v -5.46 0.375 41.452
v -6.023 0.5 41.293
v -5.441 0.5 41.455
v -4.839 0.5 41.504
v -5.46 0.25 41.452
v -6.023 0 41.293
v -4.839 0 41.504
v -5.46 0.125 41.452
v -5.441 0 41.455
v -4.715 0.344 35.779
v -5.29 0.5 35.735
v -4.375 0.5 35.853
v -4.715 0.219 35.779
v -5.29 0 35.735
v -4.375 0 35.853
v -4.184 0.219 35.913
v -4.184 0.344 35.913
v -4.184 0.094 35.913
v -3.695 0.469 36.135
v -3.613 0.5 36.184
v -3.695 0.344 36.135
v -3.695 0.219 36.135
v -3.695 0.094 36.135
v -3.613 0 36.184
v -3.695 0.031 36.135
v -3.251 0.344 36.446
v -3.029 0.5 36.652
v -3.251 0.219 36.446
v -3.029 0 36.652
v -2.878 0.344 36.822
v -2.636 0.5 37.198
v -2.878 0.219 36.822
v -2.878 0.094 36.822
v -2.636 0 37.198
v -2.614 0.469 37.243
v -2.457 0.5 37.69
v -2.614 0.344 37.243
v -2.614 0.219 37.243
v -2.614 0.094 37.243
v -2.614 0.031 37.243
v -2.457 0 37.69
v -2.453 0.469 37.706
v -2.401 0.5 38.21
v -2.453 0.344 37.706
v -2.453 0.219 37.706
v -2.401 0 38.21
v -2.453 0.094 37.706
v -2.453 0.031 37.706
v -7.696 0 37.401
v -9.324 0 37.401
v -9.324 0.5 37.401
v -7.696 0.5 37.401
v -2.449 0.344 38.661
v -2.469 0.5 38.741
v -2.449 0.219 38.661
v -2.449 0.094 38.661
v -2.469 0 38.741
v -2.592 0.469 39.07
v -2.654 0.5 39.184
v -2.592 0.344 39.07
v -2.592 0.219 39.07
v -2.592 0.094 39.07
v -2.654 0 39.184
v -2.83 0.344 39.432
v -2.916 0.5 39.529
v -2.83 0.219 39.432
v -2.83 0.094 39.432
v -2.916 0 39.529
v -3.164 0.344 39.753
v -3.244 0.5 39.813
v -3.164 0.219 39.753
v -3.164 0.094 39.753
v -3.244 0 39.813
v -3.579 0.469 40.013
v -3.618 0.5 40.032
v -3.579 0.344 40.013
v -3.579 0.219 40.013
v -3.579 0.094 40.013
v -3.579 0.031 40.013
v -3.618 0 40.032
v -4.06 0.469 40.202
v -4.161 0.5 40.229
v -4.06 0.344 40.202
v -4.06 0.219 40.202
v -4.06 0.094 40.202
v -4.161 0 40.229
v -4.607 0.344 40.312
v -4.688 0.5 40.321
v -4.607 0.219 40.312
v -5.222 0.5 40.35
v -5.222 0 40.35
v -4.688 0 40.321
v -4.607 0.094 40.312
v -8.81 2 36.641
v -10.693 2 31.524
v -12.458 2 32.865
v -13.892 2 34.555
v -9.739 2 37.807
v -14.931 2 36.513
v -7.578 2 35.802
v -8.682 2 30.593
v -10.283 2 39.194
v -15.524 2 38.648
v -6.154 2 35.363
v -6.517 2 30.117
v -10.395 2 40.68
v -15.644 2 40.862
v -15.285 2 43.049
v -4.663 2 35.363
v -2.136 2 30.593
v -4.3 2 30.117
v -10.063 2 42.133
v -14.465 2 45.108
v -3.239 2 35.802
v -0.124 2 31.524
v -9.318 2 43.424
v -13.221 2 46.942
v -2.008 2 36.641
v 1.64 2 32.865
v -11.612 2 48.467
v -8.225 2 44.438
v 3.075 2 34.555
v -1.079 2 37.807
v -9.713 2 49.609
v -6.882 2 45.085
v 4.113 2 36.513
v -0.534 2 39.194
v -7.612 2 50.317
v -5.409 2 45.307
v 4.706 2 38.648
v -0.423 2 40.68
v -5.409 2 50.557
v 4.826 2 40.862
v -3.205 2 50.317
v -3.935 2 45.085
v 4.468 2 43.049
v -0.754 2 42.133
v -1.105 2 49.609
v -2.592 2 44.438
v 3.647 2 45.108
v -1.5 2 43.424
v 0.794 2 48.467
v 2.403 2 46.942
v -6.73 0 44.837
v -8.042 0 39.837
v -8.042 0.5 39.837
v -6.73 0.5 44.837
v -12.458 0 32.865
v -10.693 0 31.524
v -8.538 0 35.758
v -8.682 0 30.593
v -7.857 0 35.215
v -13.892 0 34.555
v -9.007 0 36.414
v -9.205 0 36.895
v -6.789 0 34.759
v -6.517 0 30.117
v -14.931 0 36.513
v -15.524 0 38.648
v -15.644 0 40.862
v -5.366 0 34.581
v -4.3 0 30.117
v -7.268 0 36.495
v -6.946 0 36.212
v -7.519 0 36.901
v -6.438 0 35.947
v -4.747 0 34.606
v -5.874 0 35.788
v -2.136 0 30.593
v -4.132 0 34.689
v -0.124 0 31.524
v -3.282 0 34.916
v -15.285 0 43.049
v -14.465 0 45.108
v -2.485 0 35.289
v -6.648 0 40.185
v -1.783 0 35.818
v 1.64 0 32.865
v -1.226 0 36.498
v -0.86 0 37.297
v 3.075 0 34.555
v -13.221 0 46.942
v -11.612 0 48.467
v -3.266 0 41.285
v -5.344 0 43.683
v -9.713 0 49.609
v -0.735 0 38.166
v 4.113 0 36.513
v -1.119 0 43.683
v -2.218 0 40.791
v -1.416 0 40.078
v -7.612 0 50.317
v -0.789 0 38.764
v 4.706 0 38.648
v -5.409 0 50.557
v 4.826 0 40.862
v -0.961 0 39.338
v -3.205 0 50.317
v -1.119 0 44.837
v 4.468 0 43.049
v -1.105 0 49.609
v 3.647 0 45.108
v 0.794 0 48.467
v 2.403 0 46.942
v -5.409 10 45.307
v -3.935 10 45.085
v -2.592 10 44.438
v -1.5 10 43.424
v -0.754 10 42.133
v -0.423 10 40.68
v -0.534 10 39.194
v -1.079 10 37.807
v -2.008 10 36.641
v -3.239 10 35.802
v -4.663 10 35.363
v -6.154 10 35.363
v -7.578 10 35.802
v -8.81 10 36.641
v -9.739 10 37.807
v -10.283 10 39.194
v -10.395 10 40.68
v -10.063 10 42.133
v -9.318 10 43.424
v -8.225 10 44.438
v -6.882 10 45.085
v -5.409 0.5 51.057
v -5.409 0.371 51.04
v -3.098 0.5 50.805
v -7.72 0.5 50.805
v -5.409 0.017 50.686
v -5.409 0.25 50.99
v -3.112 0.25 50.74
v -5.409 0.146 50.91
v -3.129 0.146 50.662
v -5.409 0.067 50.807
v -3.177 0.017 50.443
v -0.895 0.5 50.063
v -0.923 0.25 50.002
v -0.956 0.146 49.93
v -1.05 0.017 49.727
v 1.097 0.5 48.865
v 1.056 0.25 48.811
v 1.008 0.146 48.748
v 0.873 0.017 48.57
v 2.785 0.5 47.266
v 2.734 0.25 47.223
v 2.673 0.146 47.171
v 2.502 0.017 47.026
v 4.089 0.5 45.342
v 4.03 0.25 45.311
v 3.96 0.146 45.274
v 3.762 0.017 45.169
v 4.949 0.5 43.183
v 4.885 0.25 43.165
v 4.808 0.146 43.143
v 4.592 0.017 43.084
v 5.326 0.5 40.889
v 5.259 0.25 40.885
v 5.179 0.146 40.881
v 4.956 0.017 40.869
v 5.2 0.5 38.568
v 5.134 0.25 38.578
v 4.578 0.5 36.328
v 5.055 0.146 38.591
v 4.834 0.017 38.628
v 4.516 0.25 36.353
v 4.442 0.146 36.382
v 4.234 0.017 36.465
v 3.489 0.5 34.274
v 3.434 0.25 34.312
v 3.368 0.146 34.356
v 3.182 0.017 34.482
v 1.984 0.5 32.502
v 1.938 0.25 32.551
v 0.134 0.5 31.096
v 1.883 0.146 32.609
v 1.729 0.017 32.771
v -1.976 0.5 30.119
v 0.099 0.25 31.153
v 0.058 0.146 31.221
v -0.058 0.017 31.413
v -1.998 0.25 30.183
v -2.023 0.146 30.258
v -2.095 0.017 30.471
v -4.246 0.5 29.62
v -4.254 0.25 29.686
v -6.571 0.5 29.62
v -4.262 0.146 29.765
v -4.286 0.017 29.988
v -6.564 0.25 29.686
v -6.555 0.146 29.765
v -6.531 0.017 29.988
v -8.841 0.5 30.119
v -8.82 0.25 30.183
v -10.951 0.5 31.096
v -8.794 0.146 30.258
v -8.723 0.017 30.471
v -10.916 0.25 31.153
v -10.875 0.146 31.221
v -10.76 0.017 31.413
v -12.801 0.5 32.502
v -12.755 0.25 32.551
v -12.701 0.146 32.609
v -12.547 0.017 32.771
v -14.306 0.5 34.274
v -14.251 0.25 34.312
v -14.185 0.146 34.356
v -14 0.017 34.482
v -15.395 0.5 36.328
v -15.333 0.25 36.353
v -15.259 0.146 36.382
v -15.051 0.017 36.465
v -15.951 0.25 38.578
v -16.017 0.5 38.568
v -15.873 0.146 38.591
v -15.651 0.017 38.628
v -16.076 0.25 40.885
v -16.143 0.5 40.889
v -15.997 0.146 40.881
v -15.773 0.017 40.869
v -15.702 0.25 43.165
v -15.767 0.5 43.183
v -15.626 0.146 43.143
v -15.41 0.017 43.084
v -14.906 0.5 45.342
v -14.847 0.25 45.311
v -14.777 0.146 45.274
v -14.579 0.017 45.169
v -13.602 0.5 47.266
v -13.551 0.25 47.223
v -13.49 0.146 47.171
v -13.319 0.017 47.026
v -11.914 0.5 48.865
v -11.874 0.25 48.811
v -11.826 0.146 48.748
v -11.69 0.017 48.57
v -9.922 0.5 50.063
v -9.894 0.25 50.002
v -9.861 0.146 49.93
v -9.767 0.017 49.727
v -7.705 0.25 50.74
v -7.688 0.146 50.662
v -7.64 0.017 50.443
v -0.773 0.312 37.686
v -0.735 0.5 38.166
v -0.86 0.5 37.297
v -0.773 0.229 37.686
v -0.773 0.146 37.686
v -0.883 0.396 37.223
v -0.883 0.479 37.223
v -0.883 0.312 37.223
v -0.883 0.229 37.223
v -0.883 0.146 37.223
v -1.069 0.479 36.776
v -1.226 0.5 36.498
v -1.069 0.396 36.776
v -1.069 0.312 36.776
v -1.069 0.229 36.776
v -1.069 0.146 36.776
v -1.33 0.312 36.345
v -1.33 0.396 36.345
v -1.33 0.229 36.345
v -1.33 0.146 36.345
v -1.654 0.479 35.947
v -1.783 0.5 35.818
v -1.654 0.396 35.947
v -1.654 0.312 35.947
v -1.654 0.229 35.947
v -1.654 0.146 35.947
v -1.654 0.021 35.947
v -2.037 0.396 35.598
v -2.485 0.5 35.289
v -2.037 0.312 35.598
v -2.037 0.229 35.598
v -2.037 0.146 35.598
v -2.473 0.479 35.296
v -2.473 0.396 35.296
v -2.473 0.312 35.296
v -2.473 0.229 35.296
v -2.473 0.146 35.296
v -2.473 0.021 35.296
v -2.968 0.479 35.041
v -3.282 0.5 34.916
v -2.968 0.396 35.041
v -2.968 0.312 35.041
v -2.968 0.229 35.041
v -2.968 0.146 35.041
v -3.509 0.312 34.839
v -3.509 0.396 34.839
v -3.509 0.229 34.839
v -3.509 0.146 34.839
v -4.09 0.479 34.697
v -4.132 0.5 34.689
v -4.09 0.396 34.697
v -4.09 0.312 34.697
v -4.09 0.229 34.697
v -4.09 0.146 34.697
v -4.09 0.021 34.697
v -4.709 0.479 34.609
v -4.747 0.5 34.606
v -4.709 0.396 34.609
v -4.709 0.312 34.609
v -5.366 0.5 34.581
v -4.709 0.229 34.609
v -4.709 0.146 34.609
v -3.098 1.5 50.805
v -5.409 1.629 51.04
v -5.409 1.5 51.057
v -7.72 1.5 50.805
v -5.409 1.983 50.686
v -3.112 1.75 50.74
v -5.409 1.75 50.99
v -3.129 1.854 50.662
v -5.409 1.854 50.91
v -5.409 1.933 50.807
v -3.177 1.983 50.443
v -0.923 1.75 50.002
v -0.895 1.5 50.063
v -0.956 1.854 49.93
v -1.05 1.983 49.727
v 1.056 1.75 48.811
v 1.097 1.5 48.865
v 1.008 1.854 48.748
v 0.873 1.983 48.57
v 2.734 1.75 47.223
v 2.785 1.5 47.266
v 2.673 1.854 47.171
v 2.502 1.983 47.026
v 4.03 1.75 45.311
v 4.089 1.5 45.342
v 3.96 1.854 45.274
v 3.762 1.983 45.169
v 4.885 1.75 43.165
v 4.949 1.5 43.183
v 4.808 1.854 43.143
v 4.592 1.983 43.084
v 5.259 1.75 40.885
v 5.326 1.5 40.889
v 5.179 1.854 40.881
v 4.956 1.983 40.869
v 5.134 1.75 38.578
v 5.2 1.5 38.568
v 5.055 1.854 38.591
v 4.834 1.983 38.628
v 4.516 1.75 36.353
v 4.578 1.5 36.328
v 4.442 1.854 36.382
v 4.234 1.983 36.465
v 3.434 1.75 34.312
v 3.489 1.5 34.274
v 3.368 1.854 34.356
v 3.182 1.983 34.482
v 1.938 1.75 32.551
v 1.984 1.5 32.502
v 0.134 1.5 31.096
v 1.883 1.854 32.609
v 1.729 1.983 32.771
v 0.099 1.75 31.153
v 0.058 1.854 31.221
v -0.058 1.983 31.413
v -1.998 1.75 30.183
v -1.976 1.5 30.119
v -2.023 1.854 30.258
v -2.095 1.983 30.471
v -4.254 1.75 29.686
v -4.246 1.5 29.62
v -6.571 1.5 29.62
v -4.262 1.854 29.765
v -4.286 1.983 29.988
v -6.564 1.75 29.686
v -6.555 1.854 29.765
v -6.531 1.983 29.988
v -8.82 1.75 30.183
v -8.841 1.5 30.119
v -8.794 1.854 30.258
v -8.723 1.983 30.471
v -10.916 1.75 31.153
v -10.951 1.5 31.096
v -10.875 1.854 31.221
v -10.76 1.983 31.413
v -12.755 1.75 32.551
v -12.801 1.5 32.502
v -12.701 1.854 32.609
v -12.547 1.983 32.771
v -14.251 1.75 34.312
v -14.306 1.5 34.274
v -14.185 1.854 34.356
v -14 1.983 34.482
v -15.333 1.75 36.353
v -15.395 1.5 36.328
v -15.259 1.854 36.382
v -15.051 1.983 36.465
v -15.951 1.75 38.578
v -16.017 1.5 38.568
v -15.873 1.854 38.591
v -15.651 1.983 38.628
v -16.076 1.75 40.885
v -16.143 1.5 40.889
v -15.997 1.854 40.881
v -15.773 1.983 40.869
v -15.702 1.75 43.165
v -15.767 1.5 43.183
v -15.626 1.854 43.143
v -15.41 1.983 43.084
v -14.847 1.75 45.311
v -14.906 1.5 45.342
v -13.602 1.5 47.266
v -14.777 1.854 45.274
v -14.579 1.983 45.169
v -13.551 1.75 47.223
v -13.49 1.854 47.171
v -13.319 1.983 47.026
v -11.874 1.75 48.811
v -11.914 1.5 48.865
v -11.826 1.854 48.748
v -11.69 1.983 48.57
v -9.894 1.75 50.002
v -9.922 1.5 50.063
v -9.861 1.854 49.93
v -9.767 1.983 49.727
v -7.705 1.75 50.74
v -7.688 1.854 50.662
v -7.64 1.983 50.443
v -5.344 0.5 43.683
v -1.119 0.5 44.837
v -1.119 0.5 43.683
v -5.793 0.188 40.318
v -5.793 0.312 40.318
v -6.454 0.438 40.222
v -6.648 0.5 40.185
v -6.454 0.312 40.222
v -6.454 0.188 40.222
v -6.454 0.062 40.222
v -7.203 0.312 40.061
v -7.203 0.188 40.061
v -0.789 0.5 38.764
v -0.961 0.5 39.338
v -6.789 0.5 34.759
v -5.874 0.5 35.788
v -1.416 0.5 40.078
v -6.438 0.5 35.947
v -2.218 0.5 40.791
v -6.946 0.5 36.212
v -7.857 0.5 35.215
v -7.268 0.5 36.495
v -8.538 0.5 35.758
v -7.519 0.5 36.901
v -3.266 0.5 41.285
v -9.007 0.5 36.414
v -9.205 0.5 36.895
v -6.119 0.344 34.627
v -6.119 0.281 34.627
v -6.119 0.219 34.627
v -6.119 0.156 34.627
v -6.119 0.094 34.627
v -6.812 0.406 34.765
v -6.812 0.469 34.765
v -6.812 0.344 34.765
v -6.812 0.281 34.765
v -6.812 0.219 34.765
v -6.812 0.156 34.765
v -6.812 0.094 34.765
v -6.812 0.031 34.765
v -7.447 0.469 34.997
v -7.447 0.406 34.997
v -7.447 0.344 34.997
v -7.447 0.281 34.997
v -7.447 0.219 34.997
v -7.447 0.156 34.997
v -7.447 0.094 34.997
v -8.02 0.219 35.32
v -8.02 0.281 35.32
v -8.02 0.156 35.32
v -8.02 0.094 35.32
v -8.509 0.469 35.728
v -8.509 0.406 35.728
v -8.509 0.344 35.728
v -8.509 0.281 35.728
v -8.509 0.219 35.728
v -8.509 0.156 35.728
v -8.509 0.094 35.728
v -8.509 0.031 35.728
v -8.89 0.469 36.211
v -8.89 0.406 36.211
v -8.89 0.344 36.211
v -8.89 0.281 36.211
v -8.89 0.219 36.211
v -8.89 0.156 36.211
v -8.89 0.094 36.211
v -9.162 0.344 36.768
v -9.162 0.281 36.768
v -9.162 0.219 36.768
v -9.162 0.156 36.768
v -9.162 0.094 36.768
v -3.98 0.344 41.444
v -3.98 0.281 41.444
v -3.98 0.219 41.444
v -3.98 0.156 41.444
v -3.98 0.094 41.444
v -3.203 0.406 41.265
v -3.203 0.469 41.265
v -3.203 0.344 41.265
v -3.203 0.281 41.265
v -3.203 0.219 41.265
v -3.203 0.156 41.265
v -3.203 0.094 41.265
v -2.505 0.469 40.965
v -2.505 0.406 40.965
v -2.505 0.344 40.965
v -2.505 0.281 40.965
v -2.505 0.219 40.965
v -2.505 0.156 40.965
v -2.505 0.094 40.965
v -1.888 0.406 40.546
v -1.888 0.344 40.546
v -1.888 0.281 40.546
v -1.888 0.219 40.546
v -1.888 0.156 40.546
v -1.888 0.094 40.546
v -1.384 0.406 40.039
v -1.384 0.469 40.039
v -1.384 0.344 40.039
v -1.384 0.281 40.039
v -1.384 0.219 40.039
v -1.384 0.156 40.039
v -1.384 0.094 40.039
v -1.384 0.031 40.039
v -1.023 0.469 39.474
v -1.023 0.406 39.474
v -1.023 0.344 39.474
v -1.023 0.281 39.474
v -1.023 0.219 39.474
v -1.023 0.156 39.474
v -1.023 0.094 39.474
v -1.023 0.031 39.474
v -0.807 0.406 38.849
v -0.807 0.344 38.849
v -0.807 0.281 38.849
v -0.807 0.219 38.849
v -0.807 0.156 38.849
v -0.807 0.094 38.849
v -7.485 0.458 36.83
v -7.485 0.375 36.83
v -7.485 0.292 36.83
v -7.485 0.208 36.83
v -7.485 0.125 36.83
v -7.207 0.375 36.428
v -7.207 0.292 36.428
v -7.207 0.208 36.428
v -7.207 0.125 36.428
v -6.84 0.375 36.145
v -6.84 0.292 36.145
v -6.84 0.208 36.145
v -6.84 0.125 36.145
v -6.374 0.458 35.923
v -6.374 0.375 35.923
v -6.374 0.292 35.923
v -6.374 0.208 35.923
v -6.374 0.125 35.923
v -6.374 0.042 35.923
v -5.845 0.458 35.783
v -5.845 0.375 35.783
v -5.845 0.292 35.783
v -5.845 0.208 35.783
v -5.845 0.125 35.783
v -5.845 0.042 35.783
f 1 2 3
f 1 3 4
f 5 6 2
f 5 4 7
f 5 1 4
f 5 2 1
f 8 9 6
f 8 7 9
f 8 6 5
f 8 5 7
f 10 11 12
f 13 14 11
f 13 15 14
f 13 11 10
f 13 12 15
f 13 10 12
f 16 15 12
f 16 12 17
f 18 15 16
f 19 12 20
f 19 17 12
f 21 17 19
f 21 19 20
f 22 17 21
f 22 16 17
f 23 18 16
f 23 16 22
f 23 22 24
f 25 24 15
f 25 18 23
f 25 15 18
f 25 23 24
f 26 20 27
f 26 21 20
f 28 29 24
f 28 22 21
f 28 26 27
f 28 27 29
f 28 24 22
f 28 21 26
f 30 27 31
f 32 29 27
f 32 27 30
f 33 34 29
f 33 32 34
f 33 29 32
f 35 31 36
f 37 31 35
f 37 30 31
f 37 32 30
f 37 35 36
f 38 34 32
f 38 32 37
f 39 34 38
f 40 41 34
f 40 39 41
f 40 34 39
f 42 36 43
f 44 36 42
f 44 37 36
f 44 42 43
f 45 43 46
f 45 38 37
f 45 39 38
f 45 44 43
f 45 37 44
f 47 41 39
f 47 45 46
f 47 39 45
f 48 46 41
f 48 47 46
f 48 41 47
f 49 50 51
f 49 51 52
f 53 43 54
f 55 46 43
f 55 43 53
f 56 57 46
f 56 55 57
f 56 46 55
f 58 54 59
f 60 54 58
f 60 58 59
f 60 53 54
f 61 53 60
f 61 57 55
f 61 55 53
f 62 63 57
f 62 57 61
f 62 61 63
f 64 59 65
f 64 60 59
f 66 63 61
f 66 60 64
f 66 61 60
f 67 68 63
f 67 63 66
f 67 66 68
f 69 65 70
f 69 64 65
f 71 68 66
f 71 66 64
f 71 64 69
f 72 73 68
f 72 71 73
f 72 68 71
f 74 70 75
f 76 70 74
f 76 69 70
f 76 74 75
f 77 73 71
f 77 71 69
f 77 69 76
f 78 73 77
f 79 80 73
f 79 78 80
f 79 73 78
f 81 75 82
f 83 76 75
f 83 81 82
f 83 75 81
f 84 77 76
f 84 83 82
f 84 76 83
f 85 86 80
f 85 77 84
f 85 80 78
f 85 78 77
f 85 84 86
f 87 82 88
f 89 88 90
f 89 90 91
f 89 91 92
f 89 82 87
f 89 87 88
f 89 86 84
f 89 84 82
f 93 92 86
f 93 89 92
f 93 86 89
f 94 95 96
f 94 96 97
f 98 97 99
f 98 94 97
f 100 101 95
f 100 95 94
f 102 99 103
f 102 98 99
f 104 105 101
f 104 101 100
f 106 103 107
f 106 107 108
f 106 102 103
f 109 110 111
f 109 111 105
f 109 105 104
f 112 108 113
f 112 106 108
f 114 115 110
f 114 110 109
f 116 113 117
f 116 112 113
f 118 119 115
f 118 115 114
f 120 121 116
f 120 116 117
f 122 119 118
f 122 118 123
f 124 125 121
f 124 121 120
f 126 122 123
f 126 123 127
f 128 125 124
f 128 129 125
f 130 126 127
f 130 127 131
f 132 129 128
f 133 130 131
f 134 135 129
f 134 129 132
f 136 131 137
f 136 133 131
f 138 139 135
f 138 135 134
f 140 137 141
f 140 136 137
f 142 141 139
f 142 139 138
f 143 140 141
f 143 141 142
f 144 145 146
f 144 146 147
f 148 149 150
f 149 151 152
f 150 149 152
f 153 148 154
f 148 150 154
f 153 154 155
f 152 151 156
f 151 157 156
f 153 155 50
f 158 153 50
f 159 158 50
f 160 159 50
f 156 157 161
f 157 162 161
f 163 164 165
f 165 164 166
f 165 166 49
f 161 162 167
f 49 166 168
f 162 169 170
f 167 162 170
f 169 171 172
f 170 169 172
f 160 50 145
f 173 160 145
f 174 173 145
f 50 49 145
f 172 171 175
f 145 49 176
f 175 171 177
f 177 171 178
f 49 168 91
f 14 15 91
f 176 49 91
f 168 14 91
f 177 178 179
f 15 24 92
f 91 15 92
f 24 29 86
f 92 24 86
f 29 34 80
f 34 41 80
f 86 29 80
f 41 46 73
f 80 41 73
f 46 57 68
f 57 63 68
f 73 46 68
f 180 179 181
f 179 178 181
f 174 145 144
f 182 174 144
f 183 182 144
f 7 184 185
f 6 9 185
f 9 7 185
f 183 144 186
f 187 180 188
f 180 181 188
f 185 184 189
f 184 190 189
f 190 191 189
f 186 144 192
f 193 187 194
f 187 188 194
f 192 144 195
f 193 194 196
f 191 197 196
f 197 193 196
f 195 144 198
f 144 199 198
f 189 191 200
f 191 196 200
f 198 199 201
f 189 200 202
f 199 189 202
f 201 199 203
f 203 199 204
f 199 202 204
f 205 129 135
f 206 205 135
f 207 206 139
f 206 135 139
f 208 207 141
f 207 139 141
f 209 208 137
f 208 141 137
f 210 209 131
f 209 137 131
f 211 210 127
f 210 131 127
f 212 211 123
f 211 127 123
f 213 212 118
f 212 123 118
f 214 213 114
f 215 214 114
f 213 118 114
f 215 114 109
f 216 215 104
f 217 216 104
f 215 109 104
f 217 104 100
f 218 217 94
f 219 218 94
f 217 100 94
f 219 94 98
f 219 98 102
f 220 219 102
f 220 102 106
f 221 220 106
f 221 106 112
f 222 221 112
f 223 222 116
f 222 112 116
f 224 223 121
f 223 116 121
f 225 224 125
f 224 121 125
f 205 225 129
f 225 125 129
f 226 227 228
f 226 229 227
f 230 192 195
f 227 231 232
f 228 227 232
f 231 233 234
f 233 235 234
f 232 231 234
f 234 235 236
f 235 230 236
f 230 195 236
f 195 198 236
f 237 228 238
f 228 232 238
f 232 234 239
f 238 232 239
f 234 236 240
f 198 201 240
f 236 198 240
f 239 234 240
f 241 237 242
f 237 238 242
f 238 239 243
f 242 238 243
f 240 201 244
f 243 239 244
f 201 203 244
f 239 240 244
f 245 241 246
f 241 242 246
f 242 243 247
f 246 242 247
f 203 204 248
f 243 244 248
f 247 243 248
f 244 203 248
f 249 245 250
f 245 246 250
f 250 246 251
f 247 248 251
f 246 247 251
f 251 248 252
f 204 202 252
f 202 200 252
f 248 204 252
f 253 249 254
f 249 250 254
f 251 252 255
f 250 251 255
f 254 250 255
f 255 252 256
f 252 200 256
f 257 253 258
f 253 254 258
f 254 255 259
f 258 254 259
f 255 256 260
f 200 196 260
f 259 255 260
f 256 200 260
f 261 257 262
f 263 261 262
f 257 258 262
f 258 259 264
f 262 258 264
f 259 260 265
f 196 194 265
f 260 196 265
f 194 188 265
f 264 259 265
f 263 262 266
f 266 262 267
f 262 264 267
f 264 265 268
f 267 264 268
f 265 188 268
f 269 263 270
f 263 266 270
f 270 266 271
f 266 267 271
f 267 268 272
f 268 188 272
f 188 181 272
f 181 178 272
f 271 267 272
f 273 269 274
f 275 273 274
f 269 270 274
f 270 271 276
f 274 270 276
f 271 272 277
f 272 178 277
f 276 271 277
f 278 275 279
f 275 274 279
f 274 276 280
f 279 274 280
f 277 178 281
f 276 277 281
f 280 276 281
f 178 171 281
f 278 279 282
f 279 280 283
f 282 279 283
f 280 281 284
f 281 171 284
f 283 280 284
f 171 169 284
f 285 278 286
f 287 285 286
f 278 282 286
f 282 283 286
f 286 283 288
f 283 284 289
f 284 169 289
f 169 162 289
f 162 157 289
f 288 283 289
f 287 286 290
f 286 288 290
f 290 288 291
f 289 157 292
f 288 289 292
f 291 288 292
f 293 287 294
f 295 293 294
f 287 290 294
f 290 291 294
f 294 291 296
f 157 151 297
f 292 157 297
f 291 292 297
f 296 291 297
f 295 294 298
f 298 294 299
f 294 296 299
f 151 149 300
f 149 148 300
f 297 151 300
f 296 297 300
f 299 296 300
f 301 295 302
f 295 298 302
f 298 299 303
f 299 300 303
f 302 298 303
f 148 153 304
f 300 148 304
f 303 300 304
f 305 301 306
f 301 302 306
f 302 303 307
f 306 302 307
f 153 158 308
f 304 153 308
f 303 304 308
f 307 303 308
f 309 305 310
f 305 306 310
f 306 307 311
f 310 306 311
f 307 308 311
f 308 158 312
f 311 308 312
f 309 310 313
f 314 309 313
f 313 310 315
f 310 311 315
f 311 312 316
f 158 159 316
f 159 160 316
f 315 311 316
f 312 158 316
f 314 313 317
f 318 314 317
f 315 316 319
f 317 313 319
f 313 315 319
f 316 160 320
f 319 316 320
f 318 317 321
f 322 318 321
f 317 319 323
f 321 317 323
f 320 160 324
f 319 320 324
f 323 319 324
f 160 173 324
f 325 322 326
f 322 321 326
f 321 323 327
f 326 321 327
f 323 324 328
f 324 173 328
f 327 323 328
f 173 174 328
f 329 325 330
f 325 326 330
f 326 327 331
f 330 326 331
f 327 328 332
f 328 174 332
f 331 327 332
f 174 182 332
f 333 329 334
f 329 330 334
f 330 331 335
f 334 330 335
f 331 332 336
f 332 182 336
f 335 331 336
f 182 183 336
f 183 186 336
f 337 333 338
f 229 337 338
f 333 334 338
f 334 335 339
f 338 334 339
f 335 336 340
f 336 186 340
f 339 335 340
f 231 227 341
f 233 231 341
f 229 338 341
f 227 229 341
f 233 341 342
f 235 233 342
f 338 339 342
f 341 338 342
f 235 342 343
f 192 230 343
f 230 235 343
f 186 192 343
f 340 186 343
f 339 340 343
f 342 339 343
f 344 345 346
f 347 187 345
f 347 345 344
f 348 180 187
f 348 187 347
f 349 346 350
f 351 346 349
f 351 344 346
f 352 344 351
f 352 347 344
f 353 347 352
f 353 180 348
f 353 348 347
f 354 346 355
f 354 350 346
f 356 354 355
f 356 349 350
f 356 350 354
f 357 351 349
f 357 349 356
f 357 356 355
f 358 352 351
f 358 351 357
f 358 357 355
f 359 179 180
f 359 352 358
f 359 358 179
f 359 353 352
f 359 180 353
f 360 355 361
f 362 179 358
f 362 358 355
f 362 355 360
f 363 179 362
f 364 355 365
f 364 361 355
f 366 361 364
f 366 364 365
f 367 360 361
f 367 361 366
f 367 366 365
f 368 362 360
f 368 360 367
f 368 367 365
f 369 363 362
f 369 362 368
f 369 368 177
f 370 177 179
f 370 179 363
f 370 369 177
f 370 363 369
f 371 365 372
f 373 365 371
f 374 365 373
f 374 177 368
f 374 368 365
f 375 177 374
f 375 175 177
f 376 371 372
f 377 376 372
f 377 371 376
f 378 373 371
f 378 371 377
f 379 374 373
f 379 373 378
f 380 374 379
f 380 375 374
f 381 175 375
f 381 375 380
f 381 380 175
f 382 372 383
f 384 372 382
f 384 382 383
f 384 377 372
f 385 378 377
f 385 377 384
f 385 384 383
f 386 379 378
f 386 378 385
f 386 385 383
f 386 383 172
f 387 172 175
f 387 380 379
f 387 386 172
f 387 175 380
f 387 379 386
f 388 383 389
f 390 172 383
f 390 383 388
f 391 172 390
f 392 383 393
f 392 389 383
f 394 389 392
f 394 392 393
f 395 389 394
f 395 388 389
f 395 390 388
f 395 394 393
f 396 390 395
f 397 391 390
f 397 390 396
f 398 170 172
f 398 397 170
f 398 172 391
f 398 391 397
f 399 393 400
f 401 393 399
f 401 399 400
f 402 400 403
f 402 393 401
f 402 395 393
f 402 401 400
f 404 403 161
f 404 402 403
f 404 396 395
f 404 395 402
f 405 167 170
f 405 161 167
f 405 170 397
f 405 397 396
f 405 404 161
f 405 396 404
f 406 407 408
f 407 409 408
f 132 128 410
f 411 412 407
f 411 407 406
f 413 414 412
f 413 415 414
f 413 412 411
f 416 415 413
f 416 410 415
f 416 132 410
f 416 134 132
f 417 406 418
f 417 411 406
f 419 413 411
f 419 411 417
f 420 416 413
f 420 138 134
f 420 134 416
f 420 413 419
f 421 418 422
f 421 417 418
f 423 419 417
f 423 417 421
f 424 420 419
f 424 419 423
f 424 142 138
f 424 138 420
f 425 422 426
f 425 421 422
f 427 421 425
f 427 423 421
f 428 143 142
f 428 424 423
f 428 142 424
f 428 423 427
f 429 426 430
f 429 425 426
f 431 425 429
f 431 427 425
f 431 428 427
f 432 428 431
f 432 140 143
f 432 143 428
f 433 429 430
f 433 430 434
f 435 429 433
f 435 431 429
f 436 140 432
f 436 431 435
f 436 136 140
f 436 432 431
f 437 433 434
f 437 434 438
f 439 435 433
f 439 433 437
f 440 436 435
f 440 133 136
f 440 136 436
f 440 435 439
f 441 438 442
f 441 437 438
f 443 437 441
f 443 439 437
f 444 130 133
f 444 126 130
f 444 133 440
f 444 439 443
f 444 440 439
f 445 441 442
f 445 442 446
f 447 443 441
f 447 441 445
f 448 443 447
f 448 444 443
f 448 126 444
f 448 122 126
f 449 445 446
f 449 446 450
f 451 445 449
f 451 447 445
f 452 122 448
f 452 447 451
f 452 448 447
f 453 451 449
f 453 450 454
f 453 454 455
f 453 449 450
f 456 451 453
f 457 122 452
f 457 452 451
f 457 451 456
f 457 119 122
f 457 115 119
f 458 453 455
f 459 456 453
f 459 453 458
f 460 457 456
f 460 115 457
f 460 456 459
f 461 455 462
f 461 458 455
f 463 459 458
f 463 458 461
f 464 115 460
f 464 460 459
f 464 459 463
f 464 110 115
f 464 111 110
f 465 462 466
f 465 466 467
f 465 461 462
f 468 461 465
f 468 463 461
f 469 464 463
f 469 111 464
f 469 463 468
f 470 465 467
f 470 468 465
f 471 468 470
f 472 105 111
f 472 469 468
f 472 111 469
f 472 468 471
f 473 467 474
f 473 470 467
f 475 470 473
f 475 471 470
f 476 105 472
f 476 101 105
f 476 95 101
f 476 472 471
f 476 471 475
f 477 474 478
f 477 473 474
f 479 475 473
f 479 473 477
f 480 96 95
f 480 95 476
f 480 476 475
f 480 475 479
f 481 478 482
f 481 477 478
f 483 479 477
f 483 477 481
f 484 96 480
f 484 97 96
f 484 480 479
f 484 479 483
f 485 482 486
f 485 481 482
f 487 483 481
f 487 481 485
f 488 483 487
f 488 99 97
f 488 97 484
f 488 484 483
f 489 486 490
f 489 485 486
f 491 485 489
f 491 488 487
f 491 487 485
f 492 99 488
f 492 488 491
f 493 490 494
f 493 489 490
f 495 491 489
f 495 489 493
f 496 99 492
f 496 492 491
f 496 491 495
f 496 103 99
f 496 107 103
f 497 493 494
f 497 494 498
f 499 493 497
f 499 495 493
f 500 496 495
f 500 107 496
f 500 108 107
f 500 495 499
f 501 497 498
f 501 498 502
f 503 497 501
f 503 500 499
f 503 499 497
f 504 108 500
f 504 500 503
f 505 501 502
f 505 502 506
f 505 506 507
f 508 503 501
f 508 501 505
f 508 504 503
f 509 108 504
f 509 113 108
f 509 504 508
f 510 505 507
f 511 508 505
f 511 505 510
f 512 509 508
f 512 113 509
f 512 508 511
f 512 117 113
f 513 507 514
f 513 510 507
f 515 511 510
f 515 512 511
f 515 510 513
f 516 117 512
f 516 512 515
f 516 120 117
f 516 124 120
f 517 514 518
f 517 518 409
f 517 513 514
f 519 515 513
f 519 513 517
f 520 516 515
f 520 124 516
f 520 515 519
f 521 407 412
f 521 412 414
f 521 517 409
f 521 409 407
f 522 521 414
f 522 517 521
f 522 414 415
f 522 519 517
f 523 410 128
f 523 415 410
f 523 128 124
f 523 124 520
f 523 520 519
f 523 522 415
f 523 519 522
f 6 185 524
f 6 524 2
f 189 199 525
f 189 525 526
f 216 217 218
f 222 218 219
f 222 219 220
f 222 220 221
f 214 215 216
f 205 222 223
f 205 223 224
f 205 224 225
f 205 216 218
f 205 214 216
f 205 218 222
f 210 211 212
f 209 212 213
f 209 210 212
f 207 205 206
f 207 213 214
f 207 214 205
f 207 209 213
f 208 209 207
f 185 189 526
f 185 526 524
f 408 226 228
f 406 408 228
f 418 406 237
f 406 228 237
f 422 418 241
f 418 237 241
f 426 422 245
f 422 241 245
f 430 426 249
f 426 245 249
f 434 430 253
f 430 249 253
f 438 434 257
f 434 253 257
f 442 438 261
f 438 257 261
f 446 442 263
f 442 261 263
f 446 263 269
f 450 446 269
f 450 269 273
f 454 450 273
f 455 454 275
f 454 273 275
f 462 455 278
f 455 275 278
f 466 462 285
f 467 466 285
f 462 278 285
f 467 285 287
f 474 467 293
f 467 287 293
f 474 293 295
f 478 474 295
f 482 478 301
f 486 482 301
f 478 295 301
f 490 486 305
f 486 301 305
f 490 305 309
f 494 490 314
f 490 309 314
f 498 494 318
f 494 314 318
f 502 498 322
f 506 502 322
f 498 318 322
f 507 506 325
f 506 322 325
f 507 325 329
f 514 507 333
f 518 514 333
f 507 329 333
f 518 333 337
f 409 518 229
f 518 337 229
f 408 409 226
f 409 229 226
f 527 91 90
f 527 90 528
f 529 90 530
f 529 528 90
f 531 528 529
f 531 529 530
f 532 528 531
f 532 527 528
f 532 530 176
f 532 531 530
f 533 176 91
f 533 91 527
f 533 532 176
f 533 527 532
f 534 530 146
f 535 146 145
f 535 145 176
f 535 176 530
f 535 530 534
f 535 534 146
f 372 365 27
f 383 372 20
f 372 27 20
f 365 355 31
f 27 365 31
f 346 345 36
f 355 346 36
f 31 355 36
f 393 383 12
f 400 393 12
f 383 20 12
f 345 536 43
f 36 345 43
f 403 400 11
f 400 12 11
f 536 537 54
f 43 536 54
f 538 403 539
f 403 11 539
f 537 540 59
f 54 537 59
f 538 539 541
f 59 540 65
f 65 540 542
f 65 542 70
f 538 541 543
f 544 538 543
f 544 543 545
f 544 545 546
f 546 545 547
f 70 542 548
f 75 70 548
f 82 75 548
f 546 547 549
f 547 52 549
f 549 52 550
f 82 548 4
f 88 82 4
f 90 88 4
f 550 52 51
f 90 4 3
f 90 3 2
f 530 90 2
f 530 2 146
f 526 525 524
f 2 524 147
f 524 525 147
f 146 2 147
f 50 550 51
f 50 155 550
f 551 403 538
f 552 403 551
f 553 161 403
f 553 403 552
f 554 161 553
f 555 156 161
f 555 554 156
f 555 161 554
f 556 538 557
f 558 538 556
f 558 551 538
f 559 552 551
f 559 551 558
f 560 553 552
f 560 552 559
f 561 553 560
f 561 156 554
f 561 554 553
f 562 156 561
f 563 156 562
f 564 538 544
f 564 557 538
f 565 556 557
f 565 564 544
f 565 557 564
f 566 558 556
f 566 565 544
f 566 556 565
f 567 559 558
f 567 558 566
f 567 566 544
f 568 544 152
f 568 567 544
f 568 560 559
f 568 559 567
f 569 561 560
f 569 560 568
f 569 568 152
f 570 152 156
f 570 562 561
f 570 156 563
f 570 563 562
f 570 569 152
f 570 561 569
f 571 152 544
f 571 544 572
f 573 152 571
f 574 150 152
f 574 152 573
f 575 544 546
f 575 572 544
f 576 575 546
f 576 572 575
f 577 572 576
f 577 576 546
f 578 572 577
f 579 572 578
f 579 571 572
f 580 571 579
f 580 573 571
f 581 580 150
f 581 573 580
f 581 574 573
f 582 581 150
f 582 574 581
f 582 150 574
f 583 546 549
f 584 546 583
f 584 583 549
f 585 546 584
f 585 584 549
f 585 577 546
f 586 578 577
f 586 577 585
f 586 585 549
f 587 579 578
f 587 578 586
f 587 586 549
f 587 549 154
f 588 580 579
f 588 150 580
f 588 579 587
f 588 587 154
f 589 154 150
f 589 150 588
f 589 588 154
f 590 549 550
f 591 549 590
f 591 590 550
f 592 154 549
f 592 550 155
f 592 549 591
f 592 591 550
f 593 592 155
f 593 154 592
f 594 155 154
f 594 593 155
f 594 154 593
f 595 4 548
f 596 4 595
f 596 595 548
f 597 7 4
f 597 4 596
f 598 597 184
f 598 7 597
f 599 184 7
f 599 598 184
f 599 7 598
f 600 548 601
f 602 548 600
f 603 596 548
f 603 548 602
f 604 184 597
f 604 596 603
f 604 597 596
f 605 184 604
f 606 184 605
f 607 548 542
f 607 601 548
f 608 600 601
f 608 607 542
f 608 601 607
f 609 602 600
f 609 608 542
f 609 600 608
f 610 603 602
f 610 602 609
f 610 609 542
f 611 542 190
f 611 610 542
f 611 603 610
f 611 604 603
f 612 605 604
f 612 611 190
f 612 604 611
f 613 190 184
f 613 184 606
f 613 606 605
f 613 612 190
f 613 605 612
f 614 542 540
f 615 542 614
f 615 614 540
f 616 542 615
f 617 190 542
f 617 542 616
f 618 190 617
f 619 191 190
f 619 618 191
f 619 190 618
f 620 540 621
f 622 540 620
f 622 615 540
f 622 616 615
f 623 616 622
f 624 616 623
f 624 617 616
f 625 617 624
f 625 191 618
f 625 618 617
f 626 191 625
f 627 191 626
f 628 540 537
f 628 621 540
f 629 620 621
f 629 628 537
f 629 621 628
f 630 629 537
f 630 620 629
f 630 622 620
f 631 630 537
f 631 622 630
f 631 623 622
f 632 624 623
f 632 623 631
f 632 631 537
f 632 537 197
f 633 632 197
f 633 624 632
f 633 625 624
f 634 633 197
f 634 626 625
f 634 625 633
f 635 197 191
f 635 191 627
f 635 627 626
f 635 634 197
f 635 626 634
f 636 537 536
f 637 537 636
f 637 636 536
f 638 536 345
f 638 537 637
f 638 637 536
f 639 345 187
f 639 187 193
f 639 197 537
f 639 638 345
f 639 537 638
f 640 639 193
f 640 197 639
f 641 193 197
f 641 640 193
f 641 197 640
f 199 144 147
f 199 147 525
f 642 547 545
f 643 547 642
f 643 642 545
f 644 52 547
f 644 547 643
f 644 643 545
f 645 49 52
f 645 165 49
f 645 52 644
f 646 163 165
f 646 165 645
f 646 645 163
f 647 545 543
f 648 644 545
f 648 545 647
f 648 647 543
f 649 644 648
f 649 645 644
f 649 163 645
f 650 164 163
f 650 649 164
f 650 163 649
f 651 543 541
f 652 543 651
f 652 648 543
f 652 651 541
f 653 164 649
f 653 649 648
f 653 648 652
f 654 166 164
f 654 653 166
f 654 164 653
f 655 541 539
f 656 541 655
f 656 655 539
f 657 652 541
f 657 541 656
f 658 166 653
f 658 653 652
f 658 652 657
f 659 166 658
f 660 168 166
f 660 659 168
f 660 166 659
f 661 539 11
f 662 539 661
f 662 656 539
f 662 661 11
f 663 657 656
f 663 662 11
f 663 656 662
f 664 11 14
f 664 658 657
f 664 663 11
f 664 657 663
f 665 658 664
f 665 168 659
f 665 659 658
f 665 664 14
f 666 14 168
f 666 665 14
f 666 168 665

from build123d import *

# Parameters (mm, degrees)
SKETCH1_R           = 10.75
BOSS_EXTRUDE5_DEPTH = 2
SKETCH4_R           = 5
BOSS_EXTRUDE6_DEPTH = 8
CUT_EXTRUDE2_DEPTH  = 0.5
FILLET1_R           = 0.5


with BuildPart() as part:
    # Sketch1 → Boss-Extrude5 (new body)
    with BuildSketch(Plane(origin=(0, 0, 0), x_dir=(1, 0, 0), z_dir=(0, 1, 0))):
        with Locations(Location((-5.408676197, -40.3067379, 0), (0, 0, 270))):
            Circle(SKETCH1_R)
    extrude(amount=BOSS_EXTRUDE5_DEPTH)

    # Sketch4 → Boss-Extrude6 (add)
    with BuildSketch(Plane(origin=(0, 2, 0), x_dir=(1, 0, 0), z_dir=(0, 1, 0))):
        with Locations(Location((-5.408676197, -40.3067379, 0), (0, 0, 270))):
            Circle(SKETCH4_R)
    extrude(amount=BOSS_EXTRUDE6_DEPTH)

    # Sketch5 → Cut-Extrude2 (cut)
    with BuildSketch(Plane.XZ):
        with BuildLine():
            Line((-1.119213117, 44.837068706), (-1.119213117, 43.683222552))
            Line((-1.119213117, 43.683222552), (-5.343972733, 43.683222552))
            Line((-5.343972733, 43.683222552), (-6.023059271, 41.293398834))
            add(Edge.make_bspline(
                [(-6.023059271, 41.293398834), (-5.932156571, 41.326006682), (-5.748327994, 41.391948115), (-5.457355976, 41.457073381), (-5.152680183, 41.494921804), (-4.944776832, 41.500766404), (-4.83916504, 41.503735373)],
                knots=[0, 0, 0, 0, 0.957717051, 1.936749544, 2.951899637, 4, 4, 4, 4], degree=3))
            add(Edge.make_bspline(
                [(-4.83916504, 41.503735373), (-4.692794844, 41.501511705), (-4.405302434, 41.497144096), (-3.984914685, 41.449022779), (-3.584114393, 41.376035058), (-3.203409576, 41.272428706), (-2.84410494, 41.134960143), (-2.503422249, 40.970833678), (-2.183430631, 40.775504615), (-1.886735045, 40.552203964), (-1.617614167, 40.307560211), (-1.380562504, 40.046212071), (-1.18207178, 39.768708327), (-1.016586663, 39.477477761), (-0.89101931, 39.170105093), (-0.800035696, 38.848376848), (-0.744603566, 38.51220008), (-0.73796564, 38.282791456), (-0.734597733, 38.166395629)],
                knots=[0, 0, 0, 0, 1.189422793, 2.336199813, 3.434961192, 4.499048693, 5.538481089, 6.55816476, 7.569214574, 8.581065566, 9.572455183, 10.521863525, 11.44380993, 12.340676557, 13.23887286, 14.135887326, 15.054198869, 16, 16, 16, 16], degree=3))
            add(Edge.make_bspline(
                [(-0.734597733, 38.166395629), (-0.736640177, 38.085517838), (-0.740703434, 37.924618805), (-0.769785303, 37.68553966), (-0.815472566, 37.451064567), (-0.880132404, 37.220499767), (-0.964125821, 36.994808543), (-1.06783674, 36.773146693), (-1.187054465, 36.554434869), (-1.327713423, 36.342988535), (-1.484068604, 36.139863296), (-1.651274877, 35.943889885), (-1.836982388, 35.763848397), (-2.036297248, 35.595294519), (-2.247651639, 35.436933598), (-2.474538943, 35.29216457), (-2.713969847, 35.157576429), (-2.969100544, 35.038319676), (-3.234502949, 34.930569363), (-3.510180209, 34.835095329), (-3.796371201, 34.758164461), (-4.092034227, 34.694367722), (-4.396528465, 34.641310625), (-4.710907901, 34.605736687), (-5.035226874, 34.586116093), (-5.254470616, 34.582498734), (-5.366007989, 34.58065845)],
                knots=[0, 0, 0, 0, 0.892114965, 1.774781853, 2.653165494, 3.525411504, 4.413472142, 5.306650977, 6.223218553, 7.158975213, 8.104883377, 9.050131562, 9.99821726, 10.954651527, 11.928515787, 12.909348305, 13.921788707, 14.956496026, 16.013925213, 17.080882478, 18.172775305, 19.281020983, 20.417001569, 21.581128518, 22.769430922, 24, 24, 24, 24], degree=3))
            add(Edge.make_bspline(
                [(-5.366007989, 34.58065845), (-5.494284486, 34.583063858), (-5.745955956, 34.587783137), (-6.116184202, 34.622034821), (-6.47081652, 34.680178398), (-6.811266316, 34.759884514), (-7.136893236, 34.864233845), (-7.447568471, 34.992564198), (-7.743090523, 35.14314329), (-8.021755023, 35.315119606), (-8.280263283, 35.507749531), (-8.511328327, 35.723822234), (-8.717302907, 35.956398551), (-8.894124812, 36.208989698), (-9.04611222, 36.478757404), (-9.167730863, 36.768695414), (-9.263331665, 37.077407764), (-9.303738659, 37.291837918), (-9.324341322, 37.40117127)],
                knots=[0, 0, 0, 0, 1.156081109, 2.268167895, 3.347613226, 4.39280983, 5.416773159, 6.426003973, 7.419190543, 8.402904802, 9.374262051, 10.319617, 11.249247452, 12.16926304, 13.093442327, 14.034631047, 14.997900376, 16, 16, 16, 16], degree=3))
            Line((-9.324341322, 37.40117127), (-7.695735553, 37.40117127))
            add(Edge.make_bspline(
                [(-7.695735553, 37.40117127), (-7.665938842, 37.29822773), (-7.609424759, 37.102979349), (-7.494386677, 36.837131133), (-7.365578693, 36.610682144), (-7.212981365, 36.424647701), (-7.037244542, 36.271186273), (-6.837886683, 36.140033103), (-6.61753111, 36.018032238), (-6.372231072, 35.91845502), (-6.113028221, 35.8367159), (-5.84405185, 35.778976521), (-5.569406027, 35.74118536), (-5.383493923, 35.736741906), (-5.289886194, 35.734504604)],
                knots=[0, 0, 0, 0, 1.209492624, 2.293990239, 3.264217245, 4.143063212, 4.998087424, 5.889275892, 6.834373525, 7.838714582, 8.874072118, 9.900821757, 10.943052634, 12, 12, 12, 12], degree=3))
            add(Edge.make_bspline(
                [(-5.289886194, 35.734504604), (-5.192324005, 35.737130811), (-5.000016086, 35.74230741), (-4.716910345, 35.773750579), (-4.444965931, 35.830559113), (-4.183508131, 35.908770189), (-3.932477159, 36.008780442), (-3.692754799, 36.132122968), (-3.463766496, 36.276386897), (-3.249014093, 36.441955602), (-3.05146791, 36.623085173), (-2.876018465, 36.816002223), (-2.730880971, 37.023688964), (-2.609082001, 37.239620566), (-2.517761773, 37.468564453), (-2.447455886, 37.705428454), (-2.410200354, 37.954886602), (-2.40427986, 38.124220181), (-2.401264399, 38.210466142)],
                knots=[0, 0, 0, 0, 1.106657597, 2.181367805, 3.225543607, 4.253442955, 5.273050397, 6.28579989, 7.306953151, 8.338528751, 9.35692601, 10.343744444, 11.289304653, 12.224986422, 13.148978842, 14.079003922, 15.021587128, 16, 16, 16, 16], degree=3))
            add(Edge.make_bspline(
                [(-2.401264399, 38.210466142), (-2.40349869, 38.287396604), (-2.407895611, 38.438790134), (-2.444921346, 38.660709645), (-2.50534817, 38.871421278), (-2.586864736, 39.072480407), (-2.697529217, 39.259124567), (-2.828175751, 39.437781279), (-2.985412858, 39.603263585), (-3.164070316, 39.757245811), (-3.36148755, 39.89819609), (-3.579946856, 40.017155777), (-3.812244826, 40.12252931), (-4.062002973, 40.206367726), (-4.32827546, 40.270150154), (-4.610885079, 40.315501078), (-4.910695843, 40.344133926), (-5.116208444, 40.347936099), (-5.22177722, 40.349889219)],
                knots=[0, 0, 0, 0, 0.930198305, 1.830562318, 2.712659836, 3.578217842, 4.446898647, 5.330622017, 6.250663937, 7.201295639, 8.18069732, 9.178676739, 10.205529286, 11.263059576, 12.360199582, 13.514207819, 14.723085422, 16, 16, 16, 16], degree=3))
            add(Edge.make_bspline(
                [(-5.22177722, 40.349889219), (-5.313303916, 40.348222189), (-5.50398839, 40.344749139), (-5.801393829, 40.318860761), (-6.120830833, 40.278998633), (-6.462766686, 40.221835601), (-6.826240906, 40.149976218), (-7.212080245, 40.060704798), (-7.620322897, 39.957040722), (-7.898916934, 39.877831976), (-8.04229004, 39.837068706)],
                knots=[0, 0, 0, 0, 0.763917436, 1.591526851, 2.490253246, 3.450542423, 4.484603654, 5.582488234, 6.755873684, 8, 8, 8, 8], degree=3))
            Line((-8.04229004, 39.837068706), (-6.730190681, 44.837068706))
            Line((-6.730190681, 44.837068706), (-1.119213117, 44.837068706))
        make_face()
    extrude(amount=-CUT_EXTRUDE2_DEPTH, mode=Mode.SUBTRACT)

    # Fillet1
    fillet1_edges = [part.edges().sort_by_distance(p)[0] for p in [
        (-5.408676197, 0, 29.5567379),
        (-5.408676197, 2, 29.5567379),
    ]]
    fillet(fillet1_edges, radius=FILLET1_R)


solid = part.part
